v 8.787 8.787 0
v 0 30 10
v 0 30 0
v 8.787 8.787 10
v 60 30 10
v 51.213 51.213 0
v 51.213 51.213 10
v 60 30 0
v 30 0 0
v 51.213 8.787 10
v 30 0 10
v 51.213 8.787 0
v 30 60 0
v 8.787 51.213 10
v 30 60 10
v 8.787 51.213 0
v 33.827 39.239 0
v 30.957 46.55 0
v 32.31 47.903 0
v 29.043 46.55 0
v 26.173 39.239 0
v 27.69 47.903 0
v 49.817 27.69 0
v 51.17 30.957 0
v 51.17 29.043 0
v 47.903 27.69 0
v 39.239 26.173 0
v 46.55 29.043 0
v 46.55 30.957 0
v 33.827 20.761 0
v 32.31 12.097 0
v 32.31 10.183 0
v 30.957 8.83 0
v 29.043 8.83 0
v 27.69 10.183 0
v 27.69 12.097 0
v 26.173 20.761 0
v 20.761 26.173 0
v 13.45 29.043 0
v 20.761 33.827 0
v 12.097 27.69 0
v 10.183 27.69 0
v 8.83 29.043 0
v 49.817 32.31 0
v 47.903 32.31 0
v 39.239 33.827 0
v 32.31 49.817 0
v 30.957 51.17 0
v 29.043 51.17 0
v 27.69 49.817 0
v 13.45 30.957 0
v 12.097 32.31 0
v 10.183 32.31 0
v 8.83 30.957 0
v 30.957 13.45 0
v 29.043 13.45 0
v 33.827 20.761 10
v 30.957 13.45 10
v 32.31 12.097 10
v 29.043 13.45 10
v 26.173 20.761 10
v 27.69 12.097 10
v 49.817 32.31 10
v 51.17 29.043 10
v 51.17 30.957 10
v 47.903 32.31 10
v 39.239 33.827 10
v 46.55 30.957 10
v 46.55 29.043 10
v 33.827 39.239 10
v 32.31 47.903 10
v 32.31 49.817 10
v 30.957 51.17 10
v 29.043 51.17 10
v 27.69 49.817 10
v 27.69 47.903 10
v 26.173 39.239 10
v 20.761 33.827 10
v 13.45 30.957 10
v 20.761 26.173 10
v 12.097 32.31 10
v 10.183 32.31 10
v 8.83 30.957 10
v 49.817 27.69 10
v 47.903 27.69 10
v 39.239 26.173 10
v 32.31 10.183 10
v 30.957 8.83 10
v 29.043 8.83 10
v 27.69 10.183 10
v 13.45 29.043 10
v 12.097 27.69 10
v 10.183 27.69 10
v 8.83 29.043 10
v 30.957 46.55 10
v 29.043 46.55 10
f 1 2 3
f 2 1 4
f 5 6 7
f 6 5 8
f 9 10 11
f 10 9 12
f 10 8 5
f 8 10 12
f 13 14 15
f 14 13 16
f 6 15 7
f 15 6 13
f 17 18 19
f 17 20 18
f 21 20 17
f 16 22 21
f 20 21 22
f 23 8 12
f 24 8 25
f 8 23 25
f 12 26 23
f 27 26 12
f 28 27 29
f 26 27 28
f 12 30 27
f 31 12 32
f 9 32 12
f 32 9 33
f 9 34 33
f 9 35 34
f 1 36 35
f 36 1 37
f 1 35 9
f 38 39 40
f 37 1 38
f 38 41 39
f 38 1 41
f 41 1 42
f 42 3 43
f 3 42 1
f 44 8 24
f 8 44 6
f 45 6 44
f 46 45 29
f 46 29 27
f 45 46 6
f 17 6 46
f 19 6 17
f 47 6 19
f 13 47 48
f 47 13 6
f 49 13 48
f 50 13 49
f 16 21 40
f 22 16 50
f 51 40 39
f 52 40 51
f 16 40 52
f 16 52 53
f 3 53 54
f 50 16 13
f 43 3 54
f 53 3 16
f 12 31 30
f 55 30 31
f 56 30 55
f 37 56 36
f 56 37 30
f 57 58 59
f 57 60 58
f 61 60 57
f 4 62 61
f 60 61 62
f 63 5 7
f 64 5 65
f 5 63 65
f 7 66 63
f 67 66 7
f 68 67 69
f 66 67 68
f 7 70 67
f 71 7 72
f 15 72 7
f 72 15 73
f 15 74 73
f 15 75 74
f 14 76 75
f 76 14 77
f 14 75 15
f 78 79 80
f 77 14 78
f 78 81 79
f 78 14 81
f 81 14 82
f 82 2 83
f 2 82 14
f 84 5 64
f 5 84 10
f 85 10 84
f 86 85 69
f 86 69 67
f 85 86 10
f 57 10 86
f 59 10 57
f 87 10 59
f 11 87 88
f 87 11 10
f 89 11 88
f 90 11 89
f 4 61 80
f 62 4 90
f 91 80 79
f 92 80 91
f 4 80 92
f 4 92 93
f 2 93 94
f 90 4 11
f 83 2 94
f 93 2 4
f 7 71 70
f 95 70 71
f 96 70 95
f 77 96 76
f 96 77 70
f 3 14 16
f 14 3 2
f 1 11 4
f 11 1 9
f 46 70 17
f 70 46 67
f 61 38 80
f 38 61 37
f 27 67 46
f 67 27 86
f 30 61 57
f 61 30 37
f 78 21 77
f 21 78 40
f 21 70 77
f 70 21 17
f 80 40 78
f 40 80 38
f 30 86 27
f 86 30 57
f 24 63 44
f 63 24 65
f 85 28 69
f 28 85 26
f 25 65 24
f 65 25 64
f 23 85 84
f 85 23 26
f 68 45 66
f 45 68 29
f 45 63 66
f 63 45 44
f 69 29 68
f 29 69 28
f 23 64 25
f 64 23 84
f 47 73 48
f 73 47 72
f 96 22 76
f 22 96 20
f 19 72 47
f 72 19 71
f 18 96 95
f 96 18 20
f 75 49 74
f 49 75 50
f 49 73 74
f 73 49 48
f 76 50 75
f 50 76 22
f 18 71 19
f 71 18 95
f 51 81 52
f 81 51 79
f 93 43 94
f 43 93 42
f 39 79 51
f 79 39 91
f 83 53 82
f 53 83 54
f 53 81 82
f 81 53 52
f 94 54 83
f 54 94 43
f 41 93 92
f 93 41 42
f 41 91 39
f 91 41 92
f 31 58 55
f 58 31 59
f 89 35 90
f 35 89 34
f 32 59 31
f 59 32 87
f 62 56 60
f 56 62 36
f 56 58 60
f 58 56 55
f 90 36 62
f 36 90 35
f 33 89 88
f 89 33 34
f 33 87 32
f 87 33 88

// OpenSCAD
$fn = 32;

// ----------------------------------------------------------------------
// Polygon plate: 8-gon R30, 4 bolt windows
// ----------------------------------------------------------------------

// --- parameters (mm) ---
sides = 8;                // number of polygon sides
plate_r = 30;             // circumscribed radius of the polygon
bore_r = 10;              // centre bore radius
bolts = 4;                // number of bolt windows
ring_r = 18.86;           // bolt-circle radius
bolt_r = 2.5;             // bolt window radius
plate_t = 10;             // plate thickness, Z (extrusion height)

plate_d = 2 * plate_r;  // circumscribed diameter
bore_d = 2 * bore_r;  // centre bore diameter
bolt_d = 2 * bolt_r;  // bolt window diameter
ring_d = 2 * ring_r;  // bolt-circle diameter

profile = [[60, 30], [51.213, 51.213], [30, 60], [8.787, 51.213], [0, 30], [8.787, 8.787], [30, 0], [51.213, 8.787]];  // primary outline, 8 points, counter clockwise
void_1 = [[39.239, 33.827], [33.827, 39.239], [26.173, 39.239], [20.761, 33.827], [20.761, 26.173], [26.173, 20.761], [33.827, 20.761], [39.239, 26.173]];  // centre bore, 8 points
void_2 = [[51.17, 30.957], [49.817, 32.31], [47.903, 32.31], [46.55, 30.957], [46.55, 29.043], [47.903, 27.69], [49.817, 27.69], [51.17, 29.043]];  // bolt window 1, 8 points
void_3 = [[32.31, 49.817], [30.957, 51.17], [29.043, 51.17], [27.69, 49.817], [27.69, 47.903], [29.043, 46.55], [30.957, 46.55], [32.31, 47.903]];  // bolt window 2, 8 points
void_4 = [[13.45, 30.957], [12.097, 32.31], [10.183, 32.31], [8.83, 30.957], [8.83, 29.043], [10.183, 27.69], [12.097, 27.69], [13.45, 29.043]];  // bolt window 3, 8 points
void_5 = [[32.31, 12.097], [30.957, 13.45], [29.043, 13.45], [27.69, 12.097], [27.69, 10.183], [29.043, 8.83], [30.957, 8.83], [32.31, 10.183]];  // bolt window 4, 8 points

// --- the one profile operation ---
difference() {
  linear_extrude(height = plate_t) polygon(points = profile);
  translate([0, 0, -1])
    linear_extrude(height = plate_t + 2) polygon(points = void_1);
  translate([0, 0, -1])
    linear_extrude(height = plate_t + 2) polygon(points = void_2);
  translate([0, 0, -1])
    linear_extrude(height = plate_t + 2) polygon(points = void_3);
  translate([0, 0, -1])
    linear_extrude(height = plate_t + 2) polygon(points = void_4);
  translate([0, 0, -1])
    linear_extrude(height = plate_t + 2) polygon(points = void_5);
}
